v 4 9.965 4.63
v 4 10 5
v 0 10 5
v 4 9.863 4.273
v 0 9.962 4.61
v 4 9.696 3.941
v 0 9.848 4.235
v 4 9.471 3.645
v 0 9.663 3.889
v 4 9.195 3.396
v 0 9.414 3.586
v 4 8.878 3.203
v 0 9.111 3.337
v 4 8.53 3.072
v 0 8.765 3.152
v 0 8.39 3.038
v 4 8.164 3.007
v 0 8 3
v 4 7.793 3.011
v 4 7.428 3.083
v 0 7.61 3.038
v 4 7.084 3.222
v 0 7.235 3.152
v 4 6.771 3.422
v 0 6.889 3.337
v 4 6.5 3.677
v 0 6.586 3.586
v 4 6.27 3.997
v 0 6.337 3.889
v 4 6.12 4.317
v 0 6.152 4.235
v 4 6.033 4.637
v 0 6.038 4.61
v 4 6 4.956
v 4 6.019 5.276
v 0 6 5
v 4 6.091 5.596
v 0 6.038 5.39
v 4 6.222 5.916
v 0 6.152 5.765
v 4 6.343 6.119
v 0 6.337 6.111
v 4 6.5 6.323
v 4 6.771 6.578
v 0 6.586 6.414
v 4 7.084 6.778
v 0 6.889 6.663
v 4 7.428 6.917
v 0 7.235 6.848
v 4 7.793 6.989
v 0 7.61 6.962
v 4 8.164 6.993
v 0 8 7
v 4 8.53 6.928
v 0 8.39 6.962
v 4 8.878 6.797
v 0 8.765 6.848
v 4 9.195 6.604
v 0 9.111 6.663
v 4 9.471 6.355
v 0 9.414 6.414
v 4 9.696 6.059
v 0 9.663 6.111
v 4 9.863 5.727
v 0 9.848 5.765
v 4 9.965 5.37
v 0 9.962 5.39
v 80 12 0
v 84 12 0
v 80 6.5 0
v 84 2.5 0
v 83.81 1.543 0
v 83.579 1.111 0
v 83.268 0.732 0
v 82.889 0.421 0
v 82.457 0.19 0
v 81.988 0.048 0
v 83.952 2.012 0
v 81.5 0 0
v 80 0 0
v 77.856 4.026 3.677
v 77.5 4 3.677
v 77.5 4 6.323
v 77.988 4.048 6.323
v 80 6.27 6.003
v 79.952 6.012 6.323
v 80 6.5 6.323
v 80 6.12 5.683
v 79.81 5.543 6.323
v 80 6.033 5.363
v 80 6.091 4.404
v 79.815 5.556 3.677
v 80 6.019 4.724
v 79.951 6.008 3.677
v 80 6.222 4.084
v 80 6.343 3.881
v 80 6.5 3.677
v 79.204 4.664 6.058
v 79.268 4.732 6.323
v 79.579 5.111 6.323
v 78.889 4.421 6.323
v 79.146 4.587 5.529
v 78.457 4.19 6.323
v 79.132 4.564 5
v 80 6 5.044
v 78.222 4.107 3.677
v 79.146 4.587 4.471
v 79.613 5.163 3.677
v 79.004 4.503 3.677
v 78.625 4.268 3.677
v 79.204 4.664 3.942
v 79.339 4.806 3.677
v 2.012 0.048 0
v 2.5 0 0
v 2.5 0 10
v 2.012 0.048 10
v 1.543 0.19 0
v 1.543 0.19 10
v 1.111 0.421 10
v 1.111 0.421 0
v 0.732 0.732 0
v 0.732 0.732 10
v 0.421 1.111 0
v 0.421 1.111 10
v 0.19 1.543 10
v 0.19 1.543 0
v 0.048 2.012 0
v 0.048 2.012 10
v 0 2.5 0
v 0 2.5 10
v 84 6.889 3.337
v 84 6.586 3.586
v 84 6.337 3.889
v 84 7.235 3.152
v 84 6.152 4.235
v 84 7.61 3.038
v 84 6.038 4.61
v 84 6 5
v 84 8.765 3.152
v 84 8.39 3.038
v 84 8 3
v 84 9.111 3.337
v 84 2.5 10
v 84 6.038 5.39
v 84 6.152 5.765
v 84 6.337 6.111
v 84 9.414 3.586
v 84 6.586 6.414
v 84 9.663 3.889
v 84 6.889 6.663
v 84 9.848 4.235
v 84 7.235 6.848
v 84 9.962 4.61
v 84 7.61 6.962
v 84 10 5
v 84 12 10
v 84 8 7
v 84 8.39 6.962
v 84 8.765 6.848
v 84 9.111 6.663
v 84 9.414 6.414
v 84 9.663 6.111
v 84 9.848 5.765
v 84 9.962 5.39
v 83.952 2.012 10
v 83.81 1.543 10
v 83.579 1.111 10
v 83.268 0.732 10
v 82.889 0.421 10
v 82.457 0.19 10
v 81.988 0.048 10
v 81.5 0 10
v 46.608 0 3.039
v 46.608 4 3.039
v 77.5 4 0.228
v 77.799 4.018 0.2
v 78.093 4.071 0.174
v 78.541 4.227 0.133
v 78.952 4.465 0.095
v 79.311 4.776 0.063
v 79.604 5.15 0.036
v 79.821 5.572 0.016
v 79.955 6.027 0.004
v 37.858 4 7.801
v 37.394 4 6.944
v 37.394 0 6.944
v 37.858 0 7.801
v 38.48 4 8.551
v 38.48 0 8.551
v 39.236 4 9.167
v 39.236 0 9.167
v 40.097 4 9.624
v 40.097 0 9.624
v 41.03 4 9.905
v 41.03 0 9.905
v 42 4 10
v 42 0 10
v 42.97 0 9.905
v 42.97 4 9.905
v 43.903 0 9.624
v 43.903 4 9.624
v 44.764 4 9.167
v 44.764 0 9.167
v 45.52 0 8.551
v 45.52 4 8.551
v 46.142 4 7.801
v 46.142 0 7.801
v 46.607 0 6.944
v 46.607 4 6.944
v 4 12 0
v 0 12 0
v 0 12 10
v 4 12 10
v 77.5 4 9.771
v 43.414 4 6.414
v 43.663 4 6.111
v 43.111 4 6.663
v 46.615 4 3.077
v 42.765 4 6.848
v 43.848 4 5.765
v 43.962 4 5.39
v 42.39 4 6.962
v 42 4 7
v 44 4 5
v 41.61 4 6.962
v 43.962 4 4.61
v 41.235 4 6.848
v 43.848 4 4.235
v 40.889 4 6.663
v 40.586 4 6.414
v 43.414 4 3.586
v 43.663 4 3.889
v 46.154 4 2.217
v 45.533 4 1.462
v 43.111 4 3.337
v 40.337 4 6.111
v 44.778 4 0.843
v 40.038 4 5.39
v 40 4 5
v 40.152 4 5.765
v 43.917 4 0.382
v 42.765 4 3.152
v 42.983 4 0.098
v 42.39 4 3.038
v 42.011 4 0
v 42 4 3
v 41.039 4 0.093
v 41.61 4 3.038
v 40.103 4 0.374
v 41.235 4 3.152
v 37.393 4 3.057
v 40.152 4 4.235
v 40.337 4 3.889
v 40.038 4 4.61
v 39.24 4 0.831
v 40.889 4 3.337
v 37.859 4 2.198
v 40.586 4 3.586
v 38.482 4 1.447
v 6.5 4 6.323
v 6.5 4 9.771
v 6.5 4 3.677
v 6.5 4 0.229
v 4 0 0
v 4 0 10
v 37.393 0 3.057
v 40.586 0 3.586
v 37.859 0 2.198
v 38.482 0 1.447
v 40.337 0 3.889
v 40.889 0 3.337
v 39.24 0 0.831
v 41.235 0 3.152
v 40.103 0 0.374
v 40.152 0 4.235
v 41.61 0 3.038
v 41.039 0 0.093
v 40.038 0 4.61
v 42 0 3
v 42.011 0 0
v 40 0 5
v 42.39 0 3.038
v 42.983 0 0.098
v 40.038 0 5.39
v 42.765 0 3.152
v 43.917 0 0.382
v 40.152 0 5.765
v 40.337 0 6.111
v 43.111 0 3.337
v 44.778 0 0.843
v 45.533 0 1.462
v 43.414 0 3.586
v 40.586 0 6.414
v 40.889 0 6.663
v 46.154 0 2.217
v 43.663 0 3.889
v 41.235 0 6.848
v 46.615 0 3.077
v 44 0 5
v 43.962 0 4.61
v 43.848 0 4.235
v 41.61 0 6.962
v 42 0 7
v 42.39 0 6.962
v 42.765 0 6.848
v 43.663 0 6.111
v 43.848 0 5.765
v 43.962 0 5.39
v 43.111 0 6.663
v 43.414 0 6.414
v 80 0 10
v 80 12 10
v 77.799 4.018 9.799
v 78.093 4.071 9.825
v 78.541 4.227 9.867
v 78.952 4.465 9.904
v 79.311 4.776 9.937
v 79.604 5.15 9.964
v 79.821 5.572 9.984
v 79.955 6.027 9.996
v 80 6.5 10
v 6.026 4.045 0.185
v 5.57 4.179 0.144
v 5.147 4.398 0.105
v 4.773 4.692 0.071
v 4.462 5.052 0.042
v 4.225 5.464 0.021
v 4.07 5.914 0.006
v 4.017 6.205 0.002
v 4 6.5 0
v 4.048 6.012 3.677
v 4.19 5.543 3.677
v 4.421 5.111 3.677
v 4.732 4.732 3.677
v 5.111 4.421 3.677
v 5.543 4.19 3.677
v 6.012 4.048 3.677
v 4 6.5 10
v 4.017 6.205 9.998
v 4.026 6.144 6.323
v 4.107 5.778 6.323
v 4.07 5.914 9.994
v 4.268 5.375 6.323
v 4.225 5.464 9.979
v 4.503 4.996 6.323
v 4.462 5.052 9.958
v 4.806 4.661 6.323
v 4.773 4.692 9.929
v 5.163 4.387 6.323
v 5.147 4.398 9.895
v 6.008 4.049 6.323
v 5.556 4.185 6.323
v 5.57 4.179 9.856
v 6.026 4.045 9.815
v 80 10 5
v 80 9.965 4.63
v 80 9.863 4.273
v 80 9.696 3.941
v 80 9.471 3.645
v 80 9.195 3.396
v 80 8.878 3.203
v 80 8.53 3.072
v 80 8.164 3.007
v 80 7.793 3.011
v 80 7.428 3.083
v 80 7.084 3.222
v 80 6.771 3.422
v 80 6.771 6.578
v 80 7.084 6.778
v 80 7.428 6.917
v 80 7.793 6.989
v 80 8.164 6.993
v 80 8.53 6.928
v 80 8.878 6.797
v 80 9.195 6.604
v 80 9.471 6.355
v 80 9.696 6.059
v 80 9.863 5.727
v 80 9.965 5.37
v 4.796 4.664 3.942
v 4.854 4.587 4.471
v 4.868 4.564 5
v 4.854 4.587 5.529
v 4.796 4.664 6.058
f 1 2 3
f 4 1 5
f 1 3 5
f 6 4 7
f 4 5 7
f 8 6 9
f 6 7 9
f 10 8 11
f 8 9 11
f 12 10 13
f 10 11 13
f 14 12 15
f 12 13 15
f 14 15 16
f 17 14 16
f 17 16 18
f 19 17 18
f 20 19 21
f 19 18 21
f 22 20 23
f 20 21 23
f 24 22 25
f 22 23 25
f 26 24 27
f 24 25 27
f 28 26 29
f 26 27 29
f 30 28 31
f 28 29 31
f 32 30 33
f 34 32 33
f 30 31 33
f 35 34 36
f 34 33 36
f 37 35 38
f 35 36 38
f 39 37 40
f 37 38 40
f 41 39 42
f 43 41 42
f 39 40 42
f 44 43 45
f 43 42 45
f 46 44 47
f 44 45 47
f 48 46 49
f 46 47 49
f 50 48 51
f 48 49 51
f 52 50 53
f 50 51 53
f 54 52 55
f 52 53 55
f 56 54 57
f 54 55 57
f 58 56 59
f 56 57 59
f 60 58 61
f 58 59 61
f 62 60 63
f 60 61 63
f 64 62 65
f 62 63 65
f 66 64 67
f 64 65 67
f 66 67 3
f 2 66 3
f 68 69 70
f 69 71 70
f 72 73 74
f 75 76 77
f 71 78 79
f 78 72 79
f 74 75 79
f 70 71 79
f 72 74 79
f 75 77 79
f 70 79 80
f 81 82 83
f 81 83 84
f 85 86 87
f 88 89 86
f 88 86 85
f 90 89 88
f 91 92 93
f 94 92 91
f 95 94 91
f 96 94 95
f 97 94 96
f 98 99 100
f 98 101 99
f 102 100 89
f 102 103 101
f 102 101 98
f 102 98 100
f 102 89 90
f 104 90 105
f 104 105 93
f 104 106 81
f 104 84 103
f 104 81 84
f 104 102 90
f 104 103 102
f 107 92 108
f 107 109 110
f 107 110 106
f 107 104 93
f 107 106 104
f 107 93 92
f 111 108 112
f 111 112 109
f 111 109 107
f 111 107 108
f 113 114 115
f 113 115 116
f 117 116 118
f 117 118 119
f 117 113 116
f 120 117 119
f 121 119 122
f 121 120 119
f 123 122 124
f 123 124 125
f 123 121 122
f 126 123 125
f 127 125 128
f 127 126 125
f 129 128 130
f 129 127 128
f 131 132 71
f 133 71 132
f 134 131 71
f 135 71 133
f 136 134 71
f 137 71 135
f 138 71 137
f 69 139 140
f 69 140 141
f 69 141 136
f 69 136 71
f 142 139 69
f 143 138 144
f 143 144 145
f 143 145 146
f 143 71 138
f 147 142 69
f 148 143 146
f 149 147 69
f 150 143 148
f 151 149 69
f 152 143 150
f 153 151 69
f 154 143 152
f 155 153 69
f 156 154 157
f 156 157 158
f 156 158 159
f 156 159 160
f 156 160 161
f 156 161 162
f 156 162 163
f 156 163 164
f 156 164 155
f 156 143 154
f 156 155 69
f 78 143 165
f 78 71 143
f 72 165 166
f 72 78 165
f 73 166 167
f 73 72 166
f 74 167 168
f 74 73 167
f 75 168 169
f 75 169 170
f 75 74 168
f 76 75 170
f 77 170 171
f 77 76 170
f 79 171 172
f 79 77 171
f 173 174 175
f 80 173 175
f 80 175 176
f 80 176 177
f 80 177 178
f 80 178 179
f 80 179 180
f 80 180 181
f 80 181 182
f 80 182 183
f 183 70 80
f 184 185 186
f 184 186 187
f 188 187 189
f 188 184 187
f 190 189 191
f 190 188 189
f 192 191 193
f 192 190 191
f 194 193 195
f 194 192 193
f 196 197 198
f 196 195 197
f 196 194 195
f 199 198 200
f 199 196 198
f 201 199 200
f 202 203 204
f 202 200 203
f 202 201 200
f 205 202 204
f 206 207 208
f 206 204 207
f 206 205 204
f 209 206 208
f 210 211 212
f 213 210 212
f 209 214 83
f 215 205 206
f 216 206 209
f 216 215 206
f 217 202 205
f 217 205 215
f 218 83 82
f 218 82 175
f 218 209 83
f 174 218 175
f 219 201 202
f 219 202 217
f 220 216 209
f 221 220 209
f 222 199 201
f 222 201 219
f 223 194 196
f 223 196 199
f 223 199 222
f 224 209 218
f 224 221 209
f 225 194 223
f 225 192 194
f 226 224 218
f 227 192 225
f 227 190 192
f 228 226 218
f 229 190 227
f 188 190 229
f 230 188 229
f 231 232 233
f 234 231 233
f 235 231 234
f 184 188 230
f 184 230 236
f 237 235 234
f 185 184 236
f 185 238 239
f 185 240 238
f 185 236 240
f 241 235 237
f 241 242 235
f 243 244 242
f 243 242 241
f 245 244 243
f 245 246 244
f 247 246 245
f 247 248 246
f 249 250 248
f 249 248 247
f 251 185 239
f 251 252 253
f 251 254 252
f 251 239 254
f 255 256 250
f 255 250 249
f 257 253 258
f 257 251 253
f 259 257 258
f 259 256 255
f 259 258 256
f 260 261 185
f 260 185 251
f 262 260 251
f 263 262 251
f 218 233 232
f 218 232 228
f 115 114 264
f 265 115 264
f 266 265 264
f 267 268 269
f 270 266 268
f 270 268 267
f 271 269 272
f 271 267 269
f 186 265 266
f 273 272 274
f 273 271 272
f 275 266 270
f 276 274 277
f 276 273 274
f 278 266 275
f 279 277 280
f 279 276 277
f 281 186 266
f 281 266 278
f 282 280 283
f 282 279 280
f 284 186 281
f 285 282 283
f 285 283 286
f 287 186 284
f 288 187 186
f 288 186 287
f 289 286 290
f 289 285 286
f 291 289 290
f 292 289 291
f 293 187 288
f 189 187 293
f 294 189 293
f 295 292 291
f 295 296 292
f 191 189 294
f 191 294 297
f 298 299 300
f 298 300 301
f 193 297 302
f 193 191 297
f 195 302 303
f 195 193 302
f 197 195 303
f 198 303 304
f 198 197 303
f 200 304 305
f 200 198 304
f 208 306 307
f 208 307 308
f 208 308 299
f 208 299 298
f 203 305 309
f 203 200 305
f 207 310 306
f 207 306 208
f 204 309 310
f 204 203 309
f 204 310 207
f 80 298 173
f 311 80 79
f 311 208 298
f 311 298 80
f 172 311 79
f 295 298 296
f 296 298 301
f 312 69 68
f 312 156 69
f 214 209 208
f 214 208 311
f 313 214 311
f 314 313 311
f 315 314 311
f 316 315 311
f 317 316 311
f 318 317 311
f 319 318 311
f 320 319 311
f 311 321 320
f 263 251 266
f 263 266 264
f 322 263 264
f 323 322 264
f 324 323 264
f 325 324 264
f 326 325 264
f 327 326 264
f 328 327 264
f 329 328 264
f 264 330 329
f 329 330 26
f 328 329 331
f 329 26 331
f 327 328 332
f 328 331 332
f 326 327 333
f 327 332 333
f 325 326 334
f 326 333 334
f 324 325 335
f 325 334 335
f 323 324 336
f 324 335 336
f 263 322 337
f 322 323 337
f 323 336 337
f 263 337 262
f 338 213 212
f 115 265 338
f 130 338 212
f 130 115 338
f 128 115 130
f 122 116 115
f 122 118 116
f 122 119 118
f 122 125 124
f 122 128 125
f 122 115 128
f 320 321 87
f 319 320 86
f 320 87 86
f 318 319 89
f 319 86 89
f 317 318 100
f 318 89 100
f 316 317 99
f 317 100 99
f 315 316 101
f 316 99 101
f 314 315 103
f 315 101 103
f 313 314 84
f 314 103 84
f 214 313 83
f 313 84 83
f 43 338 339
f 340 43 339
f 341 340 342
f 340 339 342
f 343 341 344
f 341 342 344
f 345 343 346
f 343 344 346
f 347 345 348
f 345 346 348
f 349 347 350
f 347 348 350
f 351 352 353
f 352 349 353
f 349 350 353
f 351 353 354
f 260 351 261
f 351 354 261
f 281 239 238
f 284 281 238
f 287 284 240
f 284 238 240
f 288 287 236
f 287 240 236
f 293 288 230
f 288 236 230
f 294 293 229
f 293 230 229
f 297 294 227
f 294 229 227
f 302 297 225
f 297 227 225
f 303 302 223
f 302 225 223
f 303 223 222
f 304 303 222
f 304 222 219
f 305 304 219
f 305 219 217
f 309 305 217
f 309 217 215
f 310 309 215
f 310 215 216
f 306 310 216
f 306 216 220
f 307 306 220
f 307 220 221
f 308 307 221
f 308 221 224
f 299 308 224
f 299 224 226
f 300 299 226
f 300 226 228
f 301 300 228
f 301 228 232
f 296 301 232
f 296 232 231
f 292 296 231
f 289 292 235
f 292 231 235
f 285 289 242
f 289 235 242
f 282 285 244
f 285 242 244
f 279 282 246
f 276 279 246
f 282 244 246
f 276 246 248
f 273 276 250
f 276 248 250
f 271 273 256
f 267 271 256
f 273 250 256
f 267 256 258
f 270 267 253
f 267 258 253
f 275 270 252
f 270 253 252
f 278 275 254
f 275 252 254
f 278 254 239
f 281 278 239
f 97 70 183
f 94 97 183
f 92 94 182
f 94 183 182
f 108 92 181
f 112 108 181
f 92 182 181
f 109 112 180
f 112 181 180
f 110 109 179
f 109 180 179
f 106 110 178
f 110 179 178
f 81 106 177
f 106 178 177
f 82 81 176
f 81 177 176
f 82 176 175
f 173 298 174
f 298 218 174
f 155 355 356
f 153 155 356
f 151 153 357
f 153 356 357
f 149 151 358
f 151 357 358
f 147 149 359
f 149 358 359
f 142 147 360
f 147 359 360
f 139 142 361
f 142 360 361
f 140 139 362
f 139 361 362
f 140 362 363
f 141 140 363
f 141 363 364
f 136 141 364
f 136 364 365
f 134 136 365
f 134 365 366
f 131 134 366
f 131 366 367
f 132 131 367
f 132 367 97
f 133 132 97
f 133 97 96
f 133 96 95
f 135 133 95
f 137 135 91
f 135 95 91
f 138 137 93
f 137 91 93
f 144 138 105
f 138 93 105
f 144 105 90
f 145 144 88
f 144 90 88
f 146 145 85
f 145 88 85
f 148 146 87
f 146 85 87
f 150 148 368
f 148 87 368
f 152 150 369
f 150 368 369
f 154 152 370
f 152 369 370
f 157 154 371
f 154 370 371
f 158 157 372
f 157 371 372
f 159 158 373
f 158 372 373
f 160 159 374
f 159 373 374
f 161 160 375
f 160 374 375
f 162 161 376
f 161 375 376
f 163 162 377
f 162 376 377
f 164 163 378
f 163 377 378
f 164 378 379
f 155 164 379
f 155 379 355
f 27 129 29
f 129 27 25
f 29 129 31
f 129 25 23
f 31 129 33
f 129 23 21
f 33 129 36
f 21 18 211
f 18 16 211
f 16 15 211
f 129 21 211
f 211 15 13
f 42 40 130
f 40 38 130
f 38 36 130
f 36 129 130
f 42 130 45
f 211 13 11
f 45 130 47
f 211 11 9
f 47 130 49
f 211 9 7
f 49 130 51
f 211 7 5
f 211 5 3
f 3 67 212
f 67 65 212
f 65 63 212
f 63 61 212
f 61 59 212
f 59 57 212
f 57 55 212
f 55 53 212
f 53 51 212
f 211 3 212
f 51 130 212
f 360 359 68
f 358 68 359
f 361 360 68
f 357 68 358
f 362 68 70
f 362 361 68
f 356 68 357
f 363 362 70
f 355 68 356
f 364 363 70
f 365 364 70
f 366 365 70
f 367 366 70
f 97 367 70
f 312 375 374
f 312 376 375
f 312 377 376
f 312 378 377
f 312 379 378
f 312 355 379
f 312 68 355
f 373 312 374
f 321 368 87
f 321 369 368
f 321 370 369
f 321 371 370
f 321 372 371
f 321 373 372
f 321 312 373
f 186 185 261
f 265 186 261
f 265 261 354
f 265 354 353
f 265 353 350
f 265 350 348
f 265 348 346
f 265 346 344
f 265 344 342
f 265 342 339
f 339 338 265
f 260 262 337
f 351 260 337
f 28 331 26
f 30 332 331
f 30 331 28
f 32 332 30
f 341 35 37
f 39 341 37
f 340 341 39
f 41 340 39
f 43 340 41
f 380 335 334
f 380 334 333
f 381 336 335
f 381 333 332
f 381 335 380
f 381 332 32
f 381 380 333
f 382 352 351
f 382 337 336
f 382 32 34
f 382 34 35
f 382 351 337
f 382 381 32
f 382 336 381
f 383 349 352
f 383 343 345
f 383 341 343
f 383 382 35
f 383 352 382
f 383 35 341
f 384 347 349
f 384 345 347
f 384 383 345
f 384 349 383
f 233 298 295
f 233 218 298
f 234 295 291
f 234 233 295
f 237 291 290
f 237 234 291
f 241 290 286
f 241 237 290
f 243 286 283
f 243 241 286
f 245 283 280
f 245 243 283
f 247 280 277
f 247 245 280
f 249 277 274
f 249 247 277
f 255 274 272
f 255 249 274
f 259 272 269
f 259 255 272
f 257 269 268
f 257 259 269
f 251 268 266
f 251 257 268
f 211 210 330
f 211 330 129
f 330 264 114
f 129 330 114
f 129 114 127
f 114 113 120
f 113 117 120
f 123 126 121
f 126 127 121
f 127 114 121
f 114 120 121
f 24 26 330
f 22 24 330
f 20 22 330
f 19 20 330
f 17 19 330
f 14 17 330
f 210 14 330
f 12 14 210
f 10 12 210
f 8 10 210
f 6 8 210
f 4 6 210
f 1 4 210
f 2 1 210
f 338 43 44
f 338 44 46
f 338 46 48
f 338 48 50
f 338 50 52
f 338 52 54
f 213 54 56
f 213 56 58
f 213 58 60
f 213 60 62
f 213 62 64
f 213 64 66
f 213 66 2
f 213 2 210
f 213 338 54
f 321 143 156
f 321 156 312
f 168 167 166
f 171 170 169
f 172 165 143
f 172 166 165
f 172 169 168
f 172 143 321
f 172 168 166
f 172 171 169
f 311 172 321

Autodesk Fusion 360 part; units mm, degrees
sketch "Sketch1" plane through (0, 0, 0) normal (1, 0, 0) x (0, 1, 0)
  line L0 (0, 0) -> (12, 0)
  line L1 (12, 0) -> (12, 10)
  line L2 (12, 10) -> (0, 10)
  line L3 (0, 10) -> (0, 0)
  circle A0 centre (8, 5) radius 2
  dimension "d3" = 12
  dimension "d4" = 4
extrude "Extrude1" add sketch "Sketch1" along normal blind 4 contours L0 L1 L2 L3 | A0 makes body 1
extrude "Extrude2" add sketch "Sketch1" along normal blind 4 separate body makes body 2
extrude "Extrude4" cut sketch "Sketch1" along normal blind 125 contours A0 bodies 1
sketch "Sketch3" plane through (0, 6, 5) normal (1, 0, 0) x (0, 1, 0)
  line L0 (-6, 5) -> (-2, 5)
  line L1 (-2, 5) -> (-2, -5)
  line L2 (-6, -5) -> (-6, 5)
  line L3 (-2, -5) -> (-6, -5)
extrude "Extrude5" add sketch "Sketch3" along normal blind 80 bodies 1 2
sketch "Sketch4" plane through (0, 4, 0) normal (0, 1, 0) x (-1, 0, 0)
  line L0 (-4, 0) -> (-4, 10)
  line L1 (-4, 10) -> (-80, 10)
  line L2 (-80, 10) -> (-80, 0)
  line L3 (-80, 0) -> (-4, 0)
  circle A0 centre (-42, 5) radius 2
extrude "Extrude6" cut sketch "Sketch4" against normal blind 14 contours A0 bodies 1
sketch "Sketch5" plane through (0, 0, 10) normal (0, 0, 1) x (-1, 0, 0)
  line L0 (-4, -4) -> (-4, -12)
  line L1 (-4, -12) -> (0, -12)
  line L2 (0, -12) -> (0, 0)
  line L3 (0, 0) -> (-80, 0)
  line L4 (-80, 0) -> (-80, -4)
  line L5 (-80, -4) -> (-4, -4)
  line L6 (-80, 0) -> (-84, 0)
  line L7 (-84, 0) -> (-84, -12)
  line L8 (-84, -12) -> (-80, -12)
  line L9 (-80, -12) -> (-80, 0)
  dimension "d15" = 4
extrude "Extrude7" add sketch "Sketch5" against normal blind 10 contours L4 L6 L7 L8 L9 bodies 1
extrude "Extrude8" cut sketch "Sketch1" along normal blind 360 contours A0 bodies 1
sketch "Sketch6" plane through (0, 4, 0) normal (0, 1, 0) x (-1, 0, 0)
  circle A0 centre (-42, 5) radius 2
  line L0 (-4, 0) -> (-4, 10)
  line L1 (-4, 10) -> (-80, 10)
  line L2 (-80, 10) -> (-80, 0)
  line L3 (-80, 0) -> (-4, 0)
  circle A1 centre (-42, 5) radius 5
  line L4 (-42, 5) -> (-40, 5)
  line L5 (-37, 5) -> (-47, 5)
  line L6 (-37, 5) -> (-37.5116, 6.9335)
  line L7 (-47, 5) -> (-46.4882, 6.9334)
  line L8 (-47, 5) -> (-46.6078, 3.0388)
  line L9 (-37, 5) -> (-37.5177, 3.0682)
  line L10 (-46.4882, 6.9334) -> (-80, 10)
  line L11 (-46.6078, 3.0388) -> (-80, 0)
  line L12 (-37.5116, 6.9335) -> (-4, 10)
  line L13 (-37.5177, 3.0682) -> (-4, 0)
  dimension "d20" = 2
  dimension "d21" = 2
  dimension "d22" = 2
  dimension "d23" = 2
extrude "Extrude9" cut sketch "Sketch6" against normal blind 20 contours L1 A1 L12 | L3 A1 L13 | L1 A1 L10 | L3 A1 L8 L11 bodies 1
fillet "Fillet1" radius 2.5 4 edges at (0, 0, 5) (84, 0, 5) (80, 4, 5) (4, 4, 5) on bodies 1
